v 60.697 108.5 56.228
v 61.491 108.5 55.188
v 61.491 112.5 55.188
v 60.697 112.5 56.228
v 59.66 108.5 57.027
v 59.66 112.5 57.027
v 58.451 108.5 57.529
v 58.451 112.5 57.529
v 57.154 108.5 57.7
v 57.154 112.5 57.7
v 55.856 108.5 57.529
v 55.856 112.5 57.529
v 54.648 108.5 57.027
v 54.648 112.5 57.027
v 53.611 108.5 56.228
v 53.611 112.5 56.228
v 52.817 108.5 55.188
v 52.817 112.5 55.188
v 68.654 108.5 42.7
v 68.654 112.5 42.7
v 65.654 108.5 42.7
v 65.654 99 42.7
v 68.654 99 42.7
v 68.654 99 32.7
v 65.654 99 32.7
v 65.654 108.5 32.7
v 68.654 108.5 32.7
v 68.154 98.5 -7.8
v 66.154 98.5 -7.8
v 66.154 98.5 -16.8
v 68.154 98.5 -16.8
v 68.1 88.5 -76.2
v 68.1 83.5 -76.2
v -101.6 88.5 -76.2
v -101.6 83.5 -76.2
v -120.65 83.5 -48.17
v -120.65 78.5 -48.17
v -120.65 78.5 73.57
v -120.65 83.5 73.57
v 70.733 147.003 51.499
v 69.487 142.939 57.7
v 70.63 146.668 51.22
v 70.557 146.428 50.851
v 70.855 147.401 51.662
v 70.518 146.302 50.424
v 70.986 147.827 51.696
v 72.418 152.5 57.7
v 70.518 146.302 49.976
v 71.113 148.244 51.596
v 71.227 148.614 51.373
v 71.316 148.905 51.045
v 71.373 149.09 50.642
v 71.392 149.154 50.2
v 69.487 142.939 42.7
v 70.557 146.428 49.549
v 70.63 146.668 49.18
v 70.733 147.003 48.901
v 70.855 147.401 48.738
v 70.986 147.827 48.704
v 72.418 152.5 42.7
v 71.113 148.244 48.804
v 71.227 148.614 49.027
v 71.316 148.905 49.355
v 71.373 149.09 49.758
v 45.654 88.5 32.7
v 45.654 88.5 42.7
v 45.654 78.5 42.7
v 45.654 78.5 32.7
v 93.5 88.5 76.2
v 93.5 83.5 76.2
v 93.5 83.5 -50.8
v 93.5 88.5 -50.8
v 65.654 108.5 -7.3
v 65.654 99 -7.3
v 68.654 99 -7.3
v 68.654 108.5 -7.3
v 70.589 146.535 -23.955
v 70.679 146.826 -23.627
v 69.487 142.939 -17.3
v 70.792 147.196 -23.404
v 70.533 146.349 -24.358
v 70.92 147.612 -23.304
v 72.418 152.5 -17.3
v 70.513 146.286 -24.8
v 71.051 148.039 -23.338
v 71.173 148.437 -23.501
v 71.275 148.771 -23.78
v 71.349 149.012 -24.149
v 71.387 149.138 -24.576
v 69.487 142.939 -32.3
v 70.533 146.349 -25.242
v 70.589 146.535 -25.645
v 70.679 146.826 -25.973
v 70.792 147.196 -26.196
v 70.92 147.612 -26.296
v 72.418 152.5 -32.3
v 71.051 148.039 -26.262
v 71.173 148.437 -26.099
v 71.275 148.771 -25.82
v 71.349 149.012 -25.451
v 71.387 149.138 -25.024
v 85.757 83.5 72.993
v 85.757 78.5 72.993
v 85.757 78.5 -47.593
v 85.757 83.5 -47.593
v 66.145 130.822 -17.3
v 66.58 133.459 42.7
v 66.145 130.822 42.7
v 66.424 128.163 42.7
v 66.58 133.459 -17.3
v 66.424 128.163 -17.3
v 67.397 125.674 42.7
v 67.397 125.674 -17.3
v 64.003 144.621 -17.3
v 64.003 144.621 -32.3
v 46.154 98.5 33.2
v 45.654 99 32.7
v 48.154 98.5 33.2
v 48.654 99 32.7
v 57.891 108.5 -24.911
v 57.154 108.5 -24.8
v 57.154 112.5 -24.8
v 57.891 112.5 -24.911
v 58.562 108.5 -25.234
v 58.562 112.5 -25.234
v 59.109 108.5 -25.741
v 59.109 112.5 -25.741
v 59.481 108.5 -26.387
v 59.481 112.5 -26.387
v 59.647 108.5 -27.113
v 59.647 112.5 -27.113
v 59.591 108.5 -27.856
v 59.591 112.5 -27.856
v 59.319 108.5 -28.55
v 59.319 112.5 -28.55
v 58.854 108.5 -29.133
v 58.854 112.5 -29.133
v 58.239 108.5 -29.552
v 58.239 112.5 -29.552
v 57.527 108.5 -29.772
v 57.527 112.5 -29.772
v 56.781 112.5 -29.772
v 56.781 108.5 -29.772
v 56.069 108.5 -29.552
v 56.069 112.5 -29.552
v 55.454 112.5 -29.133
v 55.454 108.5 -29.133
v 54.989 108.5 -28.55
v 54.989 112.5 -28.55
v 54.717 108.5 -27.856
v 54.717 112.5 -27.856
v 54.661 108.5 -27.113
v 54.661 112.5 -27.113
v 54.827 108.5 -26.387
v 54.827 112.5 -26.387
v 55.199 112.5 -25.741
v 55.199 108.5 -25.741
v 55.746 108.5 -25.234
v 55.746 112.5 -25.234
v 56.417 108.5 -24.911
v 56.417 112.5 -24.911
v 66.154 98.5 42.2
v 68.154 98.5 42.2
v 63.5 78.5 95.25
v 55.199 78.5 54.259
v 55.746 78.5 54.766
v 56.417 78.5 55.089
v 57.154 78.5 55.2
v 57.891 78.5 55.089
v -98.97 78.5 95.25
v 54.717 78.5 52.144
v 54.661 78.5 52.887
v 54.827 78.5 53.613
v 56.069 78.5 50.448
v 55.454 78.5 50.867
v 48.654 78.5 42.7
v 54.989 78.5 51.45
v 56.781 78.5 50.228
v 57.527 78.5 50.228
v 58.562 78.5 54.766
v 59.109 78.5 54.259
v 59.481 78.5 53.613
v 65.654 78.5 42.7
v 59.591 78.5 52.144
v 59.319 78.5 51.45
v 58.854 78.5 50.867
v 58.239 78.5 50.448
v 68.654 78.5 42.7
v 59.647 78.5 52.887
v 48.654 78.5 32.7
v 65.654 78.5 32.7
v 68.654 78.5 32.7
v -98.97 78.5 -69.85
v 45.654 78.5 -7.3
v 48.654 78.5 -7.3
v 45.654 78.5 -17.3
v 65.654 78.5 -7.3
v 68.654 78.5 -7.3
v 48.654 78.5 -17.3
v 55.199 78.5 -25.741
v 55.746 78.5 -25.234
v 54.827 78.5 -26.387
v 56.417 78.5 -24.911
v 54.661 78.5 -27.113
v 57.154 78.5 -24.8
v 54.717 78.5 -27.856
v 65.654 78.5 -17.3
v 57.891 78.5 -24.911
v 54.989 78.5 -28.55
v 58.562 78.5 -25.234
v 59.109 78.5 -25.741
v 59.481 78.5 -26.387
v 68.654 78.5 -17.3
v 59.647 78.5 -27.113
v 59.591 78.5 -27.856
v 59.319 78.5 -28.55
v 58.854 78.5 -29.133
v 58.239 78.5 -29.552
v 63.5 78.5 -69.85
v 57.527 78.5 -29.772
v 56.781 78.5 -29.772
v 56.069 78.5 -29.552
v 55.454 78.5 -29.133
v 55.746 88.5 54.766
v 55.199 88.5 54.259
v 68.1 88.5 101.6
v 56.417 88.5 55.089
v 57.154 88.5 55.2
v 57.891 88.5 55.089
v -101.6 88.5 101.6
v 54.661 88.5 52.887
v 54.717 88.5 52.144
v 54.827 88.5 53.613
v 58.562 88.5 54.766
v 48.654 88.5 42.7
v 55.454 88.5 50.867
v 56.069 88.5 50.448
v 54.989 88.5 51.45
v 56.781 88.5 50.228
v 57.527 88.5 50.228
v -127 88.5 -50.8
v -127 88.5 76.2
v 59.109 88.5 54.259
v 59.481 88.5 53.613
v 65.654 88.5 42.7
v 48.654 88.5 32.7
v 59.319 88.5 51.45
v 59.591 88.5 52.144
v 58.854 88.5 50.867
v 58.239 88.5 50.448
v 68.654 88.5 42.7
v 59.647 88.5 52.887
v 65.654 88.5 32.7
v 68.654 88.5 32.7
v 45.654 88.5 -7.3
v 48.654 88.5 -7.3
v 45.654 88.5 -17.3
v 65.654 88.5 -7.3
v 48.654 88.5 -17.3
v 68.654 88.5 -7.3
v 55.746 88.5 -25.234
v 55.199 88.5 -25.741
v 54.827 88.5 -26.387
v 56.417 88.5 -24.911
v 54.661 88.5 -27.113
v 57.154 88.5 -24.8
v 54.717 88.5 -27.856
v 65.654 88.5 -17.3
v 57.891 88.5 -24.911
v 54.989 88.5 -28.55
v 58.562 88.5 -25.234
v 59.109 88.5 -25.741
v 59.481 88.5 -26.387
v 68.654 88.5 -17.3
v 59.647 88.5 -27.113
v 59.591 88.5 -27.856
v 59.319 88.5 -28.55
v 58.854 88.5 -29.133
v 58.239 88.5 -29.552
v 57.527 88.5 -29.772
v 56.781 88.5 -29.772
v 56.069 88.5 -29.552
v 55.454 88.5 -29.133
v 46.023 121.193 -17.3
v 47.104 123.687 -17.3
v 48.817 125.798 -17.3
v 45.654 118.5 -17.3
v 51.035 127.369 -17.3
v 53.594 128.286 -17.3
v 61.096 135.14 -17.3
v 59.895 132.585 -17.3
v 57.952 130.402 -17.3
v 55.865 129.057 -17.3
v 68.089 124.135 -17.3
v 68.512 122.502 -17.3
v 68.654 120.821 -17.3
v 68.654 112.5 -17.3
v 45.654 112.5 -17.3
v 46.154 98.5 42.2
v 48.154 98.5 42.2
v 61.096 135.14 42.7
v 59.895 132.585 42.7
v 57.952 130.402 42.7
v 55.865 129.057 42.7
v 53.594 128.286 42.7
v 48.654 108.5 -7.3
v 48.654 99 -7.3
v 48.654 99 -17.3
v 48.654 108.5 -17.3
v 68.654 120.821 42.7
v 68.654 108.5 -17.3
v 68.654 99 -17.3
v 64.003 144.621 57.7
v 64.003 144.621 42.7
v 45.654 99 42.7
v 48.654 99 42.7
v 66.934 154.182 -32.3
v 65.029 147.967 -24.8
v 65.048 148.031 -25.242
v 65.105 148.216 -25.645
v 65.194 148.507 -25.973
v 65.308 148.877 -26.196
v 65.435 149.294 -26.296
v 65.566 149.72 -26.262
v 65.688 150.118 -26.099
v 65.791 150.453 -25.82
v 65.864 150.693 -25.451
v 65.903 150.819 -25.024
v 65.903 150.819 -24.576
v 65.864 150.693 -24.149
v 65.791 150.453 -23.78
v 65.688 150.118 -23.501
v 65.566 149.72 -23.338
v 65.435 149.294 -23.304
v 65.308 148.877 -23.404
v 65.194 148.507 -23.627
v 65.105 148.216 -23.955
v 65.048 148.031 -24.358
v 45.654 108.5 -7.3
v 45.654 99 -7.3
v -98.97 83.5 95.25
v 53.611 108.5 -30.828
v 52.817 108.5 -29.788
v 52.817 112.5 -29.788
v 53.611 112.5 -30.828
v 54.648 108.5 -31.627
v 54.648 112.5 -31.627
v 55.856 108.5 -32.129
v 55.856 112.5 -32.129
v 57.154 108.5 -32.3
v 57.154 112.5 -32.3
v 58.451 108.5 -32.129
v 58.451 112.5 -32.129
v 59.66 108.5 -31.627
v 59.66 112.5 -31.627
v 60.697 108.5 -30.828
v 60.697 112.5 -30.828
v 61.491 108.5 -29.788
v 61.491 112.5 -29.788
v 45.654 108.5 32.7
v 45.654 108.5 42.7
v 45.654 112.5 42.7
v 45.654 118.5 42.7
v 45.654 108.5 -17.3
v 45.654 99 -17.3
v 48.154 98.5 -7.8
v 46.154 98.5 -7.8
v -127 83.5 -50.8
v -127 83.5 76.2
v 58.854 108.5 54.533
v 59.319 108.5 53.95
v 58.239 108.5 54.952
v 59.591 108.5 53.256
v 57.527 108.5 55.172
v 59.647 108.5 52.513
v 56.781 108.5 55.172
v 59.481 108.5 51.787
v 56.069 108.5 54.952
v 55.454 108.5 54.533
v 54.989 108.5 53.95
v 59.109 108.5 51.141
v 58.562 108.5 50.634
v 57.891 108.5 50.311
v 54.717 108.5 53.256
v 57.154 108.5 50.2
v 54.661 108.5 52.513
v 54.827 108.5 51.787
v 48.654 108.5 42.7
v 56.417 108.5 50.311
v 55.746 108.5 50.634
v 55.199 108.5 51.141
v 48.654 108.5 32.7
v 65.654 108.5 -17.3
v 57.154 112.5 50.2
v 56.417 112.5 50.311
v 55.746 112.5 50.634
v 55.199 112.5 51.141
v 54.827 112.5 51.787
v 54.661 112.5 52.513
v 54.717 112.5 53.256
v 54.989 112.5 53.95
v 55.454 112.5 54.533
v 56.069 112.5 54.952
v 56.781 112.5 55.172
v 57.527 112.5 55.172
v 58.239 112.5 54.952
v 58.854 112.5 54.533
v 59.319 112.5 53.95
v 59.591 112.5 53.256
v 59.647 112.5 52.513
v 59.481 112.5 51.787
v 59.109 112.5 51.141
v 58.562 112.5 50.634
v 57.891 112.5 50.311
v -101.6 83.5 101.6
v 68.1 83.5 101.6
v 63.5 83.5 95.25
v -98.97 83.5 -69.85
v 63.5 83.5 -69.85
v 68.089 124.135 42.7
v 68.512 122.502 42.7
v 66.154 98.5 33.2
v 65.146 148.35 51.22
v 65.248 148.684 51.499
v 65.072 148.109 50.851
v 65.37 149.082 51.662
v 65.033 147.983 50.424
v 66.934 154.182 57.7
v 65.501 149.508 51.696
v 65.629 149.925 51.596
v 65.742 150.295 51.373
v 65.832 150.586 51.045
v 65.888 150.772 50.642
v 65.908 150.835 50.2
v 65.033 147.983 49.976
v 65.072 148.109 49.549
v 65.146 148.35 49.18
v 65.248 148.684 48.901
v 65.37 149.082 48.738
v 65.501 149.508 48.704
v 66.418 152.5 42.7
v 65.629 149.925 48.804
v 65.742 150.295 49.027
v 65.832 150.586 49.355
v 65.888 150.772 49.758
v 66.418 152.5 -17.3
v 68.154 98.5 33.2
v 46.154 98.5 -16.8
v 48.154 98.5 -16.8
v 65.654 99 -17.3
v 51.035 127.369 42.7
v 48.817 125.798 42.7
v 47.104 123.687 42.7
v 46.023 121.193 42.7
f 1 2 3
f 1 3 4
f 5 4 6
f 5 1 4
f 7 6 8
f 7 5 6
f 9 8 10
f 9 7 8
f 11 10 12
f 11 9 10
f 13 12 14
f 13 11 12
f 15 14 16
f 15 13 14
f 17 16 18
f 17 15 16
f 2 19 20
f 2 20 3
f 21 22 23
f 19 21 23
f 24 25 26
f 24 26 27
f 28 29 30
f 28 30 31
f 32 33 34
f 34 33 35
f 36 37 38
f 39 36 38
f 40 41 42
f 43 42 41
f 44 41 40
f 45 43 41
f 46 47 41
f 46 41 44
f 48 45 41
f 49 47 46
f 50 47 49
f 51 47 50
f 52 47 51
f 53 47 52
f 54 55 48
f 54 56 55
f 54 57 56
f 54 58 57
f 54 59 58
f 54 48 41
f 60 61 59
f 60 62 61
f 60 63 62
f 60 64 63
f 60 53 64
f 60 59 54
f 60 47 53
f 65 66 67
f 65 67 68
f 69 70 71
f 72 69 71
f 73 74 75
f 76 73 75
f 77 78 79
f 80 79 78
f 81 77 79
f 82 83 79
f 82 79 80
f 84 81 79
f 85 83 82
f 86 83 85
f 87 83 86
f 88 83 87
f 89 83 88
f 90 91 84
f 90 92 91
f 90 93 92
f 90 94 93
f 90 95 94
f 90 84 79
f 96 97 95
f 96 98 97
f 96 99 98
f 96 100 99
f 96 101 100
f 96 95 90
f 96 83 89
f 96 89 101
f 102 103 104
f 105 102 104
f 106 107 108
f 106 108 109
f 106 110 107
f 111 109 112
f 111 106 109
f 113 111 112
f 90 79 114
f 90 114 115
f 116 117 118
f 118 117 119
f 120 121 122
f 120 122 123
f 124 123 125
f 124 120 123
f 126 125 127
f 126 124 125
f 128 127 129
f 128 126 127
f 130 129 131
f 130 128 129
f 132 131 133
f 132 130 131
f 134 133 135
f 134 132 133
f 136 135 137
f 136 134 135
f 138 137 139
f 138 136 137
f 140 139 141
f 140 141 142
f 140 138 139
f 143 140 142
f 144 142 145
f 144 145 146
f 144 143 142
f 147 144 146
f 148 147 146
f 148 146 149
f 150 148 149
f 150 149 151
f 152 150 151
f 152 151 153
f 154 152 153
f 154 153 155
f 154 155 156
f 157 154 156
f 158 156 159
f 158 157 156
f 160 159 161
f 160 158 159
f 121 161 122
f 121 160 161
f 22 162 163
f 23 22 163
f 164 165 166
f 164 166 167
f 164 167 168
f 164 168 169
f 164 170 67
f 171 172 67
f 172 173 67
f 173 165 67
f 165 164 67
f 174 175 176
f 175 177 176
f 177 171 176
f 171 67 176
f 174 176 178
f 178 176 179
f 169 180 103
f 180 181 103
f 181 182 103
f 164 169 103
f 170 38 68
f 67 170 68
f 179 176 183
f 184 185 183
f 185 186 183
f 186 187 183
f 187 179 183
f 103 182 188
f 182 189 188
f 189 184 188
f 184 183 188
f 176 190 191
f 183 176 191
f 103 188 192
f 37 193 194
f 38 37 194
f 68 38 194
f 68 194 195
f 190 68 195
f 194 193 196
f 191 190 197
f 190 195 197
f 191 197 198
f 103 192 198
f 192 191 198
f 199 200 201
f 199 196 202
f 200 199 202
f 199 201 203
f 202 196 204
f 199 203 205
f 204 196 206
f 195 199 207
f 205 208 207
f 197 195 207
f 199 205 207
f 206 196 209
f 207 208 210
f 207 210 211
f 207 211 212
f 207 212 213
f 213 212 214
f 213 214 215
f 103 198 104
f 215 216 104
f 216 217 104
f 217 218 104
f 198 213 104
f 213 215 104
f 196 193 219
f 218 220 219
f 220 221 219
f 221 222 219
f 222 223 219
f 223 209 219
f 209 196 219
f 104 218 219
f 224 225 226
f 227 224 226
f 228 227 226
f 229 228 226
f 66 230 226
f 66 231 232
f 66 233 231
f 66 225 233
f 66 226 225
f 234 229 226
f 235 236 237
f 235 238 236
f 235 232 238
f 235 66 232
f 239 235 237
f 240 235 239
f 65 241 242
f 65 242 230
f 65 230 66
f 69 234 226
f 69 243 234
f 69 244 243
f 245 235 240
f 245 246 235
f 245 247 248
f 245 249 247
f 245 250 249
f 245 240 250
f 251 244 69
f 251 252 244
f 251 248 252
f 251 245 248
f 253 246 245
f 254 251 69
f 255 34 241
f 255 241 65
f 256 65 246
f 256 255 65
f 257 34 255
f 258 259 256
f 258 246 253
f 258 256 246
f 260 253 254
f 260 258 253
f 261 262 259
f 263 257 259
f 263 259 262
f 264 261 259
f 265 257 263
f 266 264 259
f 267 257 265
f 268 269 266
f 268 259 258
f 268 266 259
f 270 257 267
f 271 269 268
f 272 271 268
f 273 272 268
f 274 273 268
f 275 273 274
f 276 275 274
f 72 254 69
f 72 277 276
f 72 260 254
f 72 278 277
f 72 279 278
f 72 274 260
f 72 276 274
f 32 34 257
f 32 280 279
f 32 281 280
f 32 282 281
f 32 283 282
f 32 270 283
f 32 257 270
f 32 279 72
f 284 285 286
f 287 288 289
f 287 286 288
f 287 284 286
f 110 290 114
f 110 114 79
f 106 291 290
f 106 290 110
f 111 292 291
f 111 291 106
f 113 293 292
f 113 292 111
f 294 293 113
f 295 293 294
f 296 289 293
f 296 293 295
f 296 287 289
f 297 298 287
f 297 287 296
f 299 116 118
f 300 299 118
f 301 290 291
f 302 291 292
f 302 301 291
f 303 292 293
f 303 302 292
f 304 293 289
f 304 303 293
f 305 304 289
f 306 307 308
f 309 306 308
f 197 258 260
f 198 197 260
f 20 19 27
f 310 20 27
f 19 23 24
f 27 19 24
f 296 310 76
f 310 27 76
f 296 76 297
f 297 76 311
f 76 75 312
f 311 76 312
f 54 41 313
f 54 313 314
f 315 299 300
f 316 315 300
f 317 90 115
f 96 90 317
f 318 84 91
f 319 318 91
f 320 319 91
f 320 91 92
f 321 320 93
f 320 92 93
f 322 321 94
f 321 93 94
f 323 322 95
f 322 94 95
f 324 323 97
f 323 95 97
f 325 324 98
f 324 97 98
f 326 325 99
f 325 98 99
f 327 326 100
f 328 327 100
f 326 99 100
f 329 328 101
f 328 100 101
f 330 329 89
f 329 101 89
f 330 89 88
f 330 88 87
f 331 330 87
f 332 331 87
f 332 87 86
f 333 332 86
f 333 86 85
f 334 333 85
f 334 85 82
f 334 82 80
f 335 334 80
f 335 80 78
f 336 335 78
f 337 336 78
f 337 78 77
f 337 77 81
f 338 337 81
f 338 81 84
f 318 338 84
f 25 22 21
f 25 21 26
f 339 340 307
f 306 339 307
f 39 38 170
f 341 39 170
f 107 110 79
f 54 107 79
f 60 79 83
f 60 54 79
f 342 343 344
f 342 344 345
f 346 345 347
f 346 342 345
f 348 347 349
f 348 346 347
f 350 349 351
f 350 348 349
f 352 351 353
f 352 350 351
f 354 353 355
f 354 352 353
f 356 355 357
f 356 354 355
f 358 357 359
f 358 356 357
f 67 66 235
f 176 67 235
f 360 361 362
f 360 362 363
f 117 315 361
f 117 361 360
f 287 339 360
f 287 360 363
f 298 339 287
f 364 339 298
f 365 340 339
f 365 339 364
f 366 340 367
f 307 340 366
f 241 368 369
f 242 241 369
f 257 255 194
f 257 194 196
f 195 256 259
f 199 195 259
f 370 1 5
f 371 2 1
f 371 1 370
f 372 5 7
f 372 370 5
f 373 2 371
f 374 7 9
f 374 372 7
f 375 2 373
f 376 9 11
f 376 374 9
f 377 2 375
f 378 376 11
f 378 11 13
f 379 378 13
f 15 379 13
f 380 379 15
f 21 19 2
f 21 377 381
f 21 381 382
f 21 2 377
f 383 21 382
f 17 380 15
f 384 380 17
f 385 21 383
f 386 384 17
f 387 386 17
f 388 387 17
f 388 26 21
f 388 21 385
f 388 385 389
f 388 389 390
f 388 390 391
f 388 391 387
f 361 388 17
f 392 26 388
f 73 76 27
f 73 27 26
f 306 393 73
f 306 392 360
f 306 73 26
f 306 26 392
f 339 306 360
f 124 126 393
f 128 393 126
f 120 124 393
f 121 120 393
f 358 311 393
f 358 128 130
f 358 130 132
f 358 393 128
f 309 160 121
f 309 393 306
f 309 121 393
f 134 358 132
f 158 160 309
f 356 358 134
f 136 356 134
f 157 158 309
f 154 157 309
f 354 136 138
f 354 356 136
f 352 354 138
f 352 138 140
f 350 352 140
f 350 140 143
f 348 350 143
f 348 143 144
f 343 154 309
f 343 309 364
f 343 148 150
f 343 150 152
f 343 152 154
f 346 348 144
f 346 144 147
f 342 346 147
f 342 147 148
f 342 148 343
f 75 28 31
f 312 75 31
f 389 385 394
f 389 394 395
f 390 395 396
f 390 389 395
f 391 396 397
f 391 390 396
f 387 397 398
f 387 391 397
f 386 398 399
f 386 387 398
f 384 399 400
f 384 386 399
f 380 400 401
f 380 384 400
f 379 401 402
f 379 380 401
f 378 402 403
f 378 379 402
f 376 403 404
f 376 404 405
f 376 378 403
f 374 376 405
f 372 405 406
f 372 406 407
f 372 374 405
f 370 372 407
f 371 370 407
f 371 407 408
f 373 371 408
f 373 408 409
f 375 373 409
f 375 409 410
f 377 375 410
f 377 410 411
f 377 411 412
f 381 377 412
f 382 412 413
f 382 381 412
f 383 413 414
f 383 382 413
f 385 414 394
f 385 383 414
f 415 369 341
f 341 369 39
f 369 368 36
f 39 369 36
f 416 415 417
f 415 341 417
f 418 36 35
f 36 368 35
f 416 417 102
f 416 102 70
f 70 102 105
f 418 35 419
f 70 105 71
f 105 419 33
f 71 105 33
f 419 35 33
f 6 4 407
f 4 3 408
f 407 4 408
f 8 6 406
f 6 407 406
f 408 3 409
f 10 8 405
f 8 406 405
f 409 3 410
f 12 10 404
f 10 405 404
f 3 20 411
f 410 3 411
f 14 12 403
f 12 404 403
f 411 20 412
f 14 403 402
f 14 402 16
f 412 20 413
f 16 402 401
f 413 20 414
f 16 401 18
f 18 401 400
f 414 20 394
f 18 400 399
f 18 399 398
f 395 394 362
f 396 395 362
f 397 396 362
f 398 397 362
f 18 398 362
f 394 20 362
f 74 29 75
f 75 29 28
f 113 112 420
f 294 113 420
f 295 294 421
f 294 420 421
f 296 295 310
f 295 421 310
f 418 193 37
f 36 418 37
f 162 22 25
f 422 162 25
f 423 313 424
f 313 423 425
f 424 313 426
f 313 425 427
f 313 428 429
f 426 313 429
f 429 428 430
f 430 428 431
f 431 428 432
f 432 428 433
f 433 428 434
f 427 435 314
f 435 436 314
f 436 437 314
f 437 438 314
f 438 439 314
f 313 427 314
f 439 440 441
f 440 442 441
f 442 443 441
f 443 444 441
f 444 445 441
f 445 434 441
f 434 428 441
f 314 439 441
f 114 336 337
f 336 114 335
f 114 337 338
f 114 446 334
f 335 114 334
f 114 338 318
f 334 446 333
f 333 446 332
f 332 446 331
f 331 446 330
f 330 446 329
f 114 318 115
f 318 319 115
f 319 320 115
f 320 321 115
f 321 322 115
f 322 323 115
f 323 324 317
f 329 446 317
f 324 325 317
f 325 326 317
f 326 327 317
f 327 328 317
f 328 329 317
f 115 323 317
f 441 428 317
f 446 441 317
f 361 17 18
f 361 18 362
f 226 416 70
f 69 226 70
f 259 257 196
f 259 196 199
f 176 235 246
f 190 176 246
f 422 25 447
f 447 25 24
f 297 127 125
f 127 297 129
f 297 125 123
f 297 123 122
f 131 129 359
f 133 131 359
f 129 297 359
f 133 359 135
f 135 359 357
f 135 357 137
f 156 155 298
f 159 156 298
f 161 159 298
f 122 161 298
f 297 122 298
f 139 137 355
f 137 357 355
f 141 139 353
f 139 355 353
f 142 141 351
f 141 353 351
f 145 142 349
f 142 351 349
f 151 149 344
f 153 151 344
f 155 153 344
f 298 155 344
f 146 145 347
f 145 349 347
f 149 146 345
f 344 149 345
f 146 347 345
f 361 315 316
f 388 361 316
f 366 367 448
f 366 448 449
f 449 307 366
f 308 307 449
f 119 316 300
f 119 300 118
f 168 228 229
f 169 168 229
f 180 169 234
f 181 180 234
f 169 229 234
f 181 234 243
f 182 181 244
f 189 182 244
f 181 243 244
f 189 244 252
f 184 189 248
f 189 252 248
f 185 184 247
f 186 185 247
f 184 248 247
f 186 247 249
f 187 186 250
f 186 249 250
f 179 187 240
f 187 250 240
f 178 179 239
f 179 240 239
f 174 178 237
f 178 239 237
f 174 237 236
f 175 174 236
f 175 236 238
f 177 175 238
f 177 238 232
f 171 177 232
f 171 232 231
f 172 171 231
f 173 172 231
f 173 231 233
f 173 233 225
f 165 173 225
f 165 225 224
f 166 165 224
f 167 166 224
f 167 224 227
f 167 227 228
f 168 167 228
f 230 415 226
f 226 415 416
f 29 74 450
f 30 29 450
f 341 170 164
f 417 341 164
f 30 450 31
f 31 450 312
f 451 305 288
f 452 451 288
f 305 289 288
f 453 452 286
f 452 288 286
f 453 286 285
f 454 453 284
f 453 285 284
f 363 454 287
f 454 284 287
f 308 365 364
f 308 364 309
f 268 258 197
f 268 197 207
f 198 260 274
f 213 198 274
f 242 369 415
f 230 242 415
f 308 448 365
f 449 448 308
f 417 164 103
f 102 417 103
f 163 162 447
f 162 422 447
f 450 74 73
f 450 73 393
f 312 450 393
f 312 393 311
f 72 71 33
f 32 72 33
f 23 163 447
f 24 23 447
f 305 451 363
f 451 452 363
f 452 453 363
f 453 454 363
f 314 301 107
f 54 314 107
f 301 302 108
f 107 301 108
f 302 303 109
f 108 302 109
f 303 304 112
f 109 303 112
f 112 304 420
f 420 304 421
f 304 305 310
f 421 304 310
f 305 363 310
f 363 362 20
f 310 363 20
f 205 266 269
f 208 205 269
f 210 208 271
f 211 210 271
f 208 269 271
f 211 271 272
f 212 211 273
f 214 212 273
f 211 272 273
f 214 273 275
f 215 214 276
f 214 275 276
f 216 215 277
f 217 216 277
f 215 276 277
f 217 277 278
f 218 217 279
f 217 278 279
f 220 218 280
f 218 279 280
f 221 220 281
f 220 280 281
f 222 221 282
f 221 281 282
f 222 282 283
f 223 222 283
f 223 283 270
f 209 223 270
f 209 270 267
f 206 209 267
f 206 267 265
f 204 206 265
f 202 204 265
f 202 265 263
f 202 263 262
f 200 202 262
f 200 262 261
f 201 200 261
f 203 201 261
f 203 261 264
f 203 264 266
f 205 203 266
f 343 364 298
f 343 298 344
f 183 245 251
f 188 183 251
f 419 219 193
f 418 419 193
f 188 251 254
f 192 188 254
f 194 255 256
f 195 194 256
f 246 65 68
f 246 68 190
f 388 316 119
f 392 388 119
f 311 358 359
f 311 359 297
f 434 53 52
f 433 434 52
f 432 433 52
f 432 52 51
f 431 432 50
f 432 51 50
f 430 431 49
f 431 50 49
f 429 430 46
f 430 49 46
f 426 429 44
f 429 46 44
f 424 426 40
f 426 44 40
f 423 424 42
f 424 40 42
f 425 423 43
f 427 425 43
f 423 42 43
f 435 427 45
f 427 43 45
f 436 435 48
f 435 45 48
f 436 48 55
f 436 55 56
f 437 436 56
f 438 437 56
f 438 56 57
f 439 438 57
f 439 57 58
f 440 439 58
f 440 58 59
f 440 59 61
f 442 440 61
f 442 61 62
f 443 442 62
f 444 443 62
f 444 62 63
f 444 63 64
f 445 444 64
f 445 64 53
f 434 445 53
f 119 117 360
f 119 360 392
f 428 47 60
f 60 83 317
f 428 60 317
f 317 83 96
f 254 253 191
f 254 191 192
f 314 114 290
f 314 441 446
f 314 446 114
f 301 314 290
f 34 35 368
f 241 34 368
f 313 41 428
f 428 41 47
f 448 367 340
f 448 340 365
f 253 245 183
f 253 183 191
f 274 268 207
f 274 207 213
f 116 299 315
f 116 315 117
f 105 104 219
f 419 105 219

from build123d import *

# Parameters (mm, degrees)
SKETCH2_W               = 190.5
SKETCH2_H               = 177.8
BOSS_EXTRUDE1_DEPTH     = 5.08
CHAMFER1_SIZE           = 25.4
BOSS_EXTRUDE3_DEPTH     = 68.42
SKETCH5_R               = 9
SKETCH5_R_2             = 1.5
CUT_EXTRUDE1_DEPTH      = 231.530019737
SKETCH10_W              = 177.8
SKETCH10_H              = 73.5
BOSS_EXTRUDE6_DEPTH     = 30
CHAMFER3_SIZE           = 25.4
CUT_EXTRUDE2_DEPTH      = 68.42
BOSS_EXTRUDE7_START     = 38.1
BOSS_EXTRUDE7_DEPTH     = 10
SKETCH13_W              = 15.24
SKETCH13_H              = 10
BOSS_EXTRUDE8_DEPTH     = 7
SKETCH14_R              = 2.5
CUT_EXTRUDE3_DEPTH      = 10
MIRROR4_COPY_1_SKETCH_W = 15.24
MIRROR4_COPY_1_SKETCH_H = 10
MIRROR4_COPY_1_DEPTH    = 7
MIRROR4_COPY_2_SKETCH_R = 2.5
MIRROR4_COPY_2_DEPTH    = 10
BOSS_EXTRUDE9_START     = 5
BOSS_EXTRUDE9_DEPTH     = 5
BOSS_EXTRUDE10_START    = 10
BOSS_EXTRUDE10_DEPTH    = 5
SKETCH16_R              = 2.5
CUT_EXTRUDE4_DEPTH      = 163.946494286
SKETCH17_W              = 3
SKETCH17_H              = 10
CUT_EXTRUDE5_DEPTH      = 163.946494286
BOSS_EXTRUDE11_START    = 10
SKETCH18_W              = 3
SKETCH18_H              = 10
BOSS_EXTRUDE11_DEPTH    = 10
BOSS_EXTRUDE11_2_DEPTH  = 10
BOSS_EXTRUDE11_3_DEPTH  = 10
BOSS_EXTRUDE11_4_DEPTH  = 10
SKETCH19_W              = 23
SKETCH19_H              = 60
BOSS_EXTRUDE12_DEPTH    = 20
BOSS_EXTRUDE13_START    = -20
SKETCH20_R              = 2.5
BOSS_EXTRUDE13_DEPTH    = 4
BOSS_EXTRUDE16_DEPTH    = 60
FILLET1_R               = 10
SKETCH24_W              = 90
SKETCH24_H              = 10
BOSS_EXTRUDE17_DEPTH    = 5.736414059
SKETCH25_R              = 1.5
CUT_EXTRUDE7_DEPTH      = 10
FILLET2_R               = 10
FILLET3_R               = 10
FILLET4_R               = 10
CHAMFER4_SIZE           = 0.5


with BuildPart() as part:
    # Sketch2 → Boss-Extrude1 (new body)
    with BuildSketch(Plane(origin=(0, 0, 0), x_dir=(1, 0, 0), z_dir=(0, 1, 0))):
        with Locations((-31.75, -12.7)):
            Rectangle(SKETCH2_W, SKETCH2_H)
    extrude(amount=BOSS_EXTRUDE1_DEPTH)

    # Chamfer1
    chamfer1_edges = [part.edges().sort_by_distance(p)[0] for p in [
        (-127, 2.54, -76.2),
        (-127, 2.54, 101.6),
    ]]
    chamfer(chamfer1_edges, length=CHAMFER1_SIZE)

    # Sketch4 → Boss-Extrude3 (add)
    with BuildSketch(Plane(origin=(0, 5.08, 0), x_dir=(1, 0, 0), z_dir=(0, 1, 0))):
        Polygon((57.15, 69.85), (-98.969743879, 69.85), (-120.65, 48.169743879), (-120.65, -73.569743879), (-98.969743879, -95.25), (57.15, -95.25), (63.5, -95.25), (63.5, -101.6), (-101.6, -101.6), (-127, -76.2), (-127, 50.8), (-101.6, 76.2), (63.5, 76.2), (63.5, 69.85), align=None)
    extrude(amount=BOSS_EXTRUDE3_DEPTH)

    # Sketch5 → Cut-Extrude1 (cut, through all)
    with BuildSketch(Plane.XY.offset(101.6)):
        with Locations((-50.8, 31.75)):
            Circle(SKETCH5_R)
        with Locations((-50.8, 47.25)):
            Circle(SKETCH5_R_2)
        with Locations((-37.376606241, 39.5)):
            Circle(SKETCH5_R_2)
        with Locations((-37.376606241, 24)):
            Circle(SKETCH5_R_2)
        with Locations((-50.8, 16.25)):
            Circle(SKETCH5_R_2)
        with Locations((-64.223393759, 24)):
            Circle(SKETCH5_R_2)
        with Locations((-64.223393759, 39.5)):
            Circle(SKETCH5_R_2)
    extrude(amount=-CUT_EXTRUDE1_DEPTH, mode=Mode.SUBTRACT)

    # Sketch10 → Boss-Extrude6 (add)
    with BuildSketch(Plane(origin=(63.5, 0, 0), x_dir=(0, 0, -1), z_dir=(1, 0, 0))):
        with Locations((-12.7, 36.75)):
            Rectangle(SKETCH10_W, SKETCH10_H)
    extrude(amount=BOSS_EXTRUDE6_DEPTH)

    # Chamfer3
    chamfer3_edges = [part.edges().sort_by_distance(p)[0] for p in [
        (93.5, 36.75, 101.6),
        (93.5, 36.75, -76.2),
    ]]
    chamfer(chamfer3_edges, length=CHAMFER3_SIZE)

    # Sketch11 → Cut-Extrude2 (cut)
    with BuildSketch(Plane(origin=(0, 73.5, 0), x_dir=(1, 0, 0), z_dir=(0, 1, 0))):
        Polygon((85.757180746, -72.992819254), (85.757180746, 47.592819254), (63.5, 69.85), (63.5, -95.25), align=None)
    extrude(amount=-CUT_EXTRUDE2_DEPTH, mode=Mode.SUBTRACT)

    # Sketch12 → Boss-Extrude7 (add)
    with BuildSketch(Plane(origin=(0, 0, 95.25), x_dir=(-1, 0, 0), z_dir=(0, 0, -1)).offset(BOSS_EXTRUDE7_START)):
        with BuildLine():
            Line((25.8, 5.08), (75.8, 5.08))
            Line((75.8, 5.08), (75.8, 31.75))
            Line((75.8, 31.75), (69.8, 31.75))
            ThreePointArc((69.8, 31.75), (50.8, 12.75), (31.8, 31.75))
            Line((31.8, 31.75), (25.8, 31.75))
            Line((25.8, 31.75), (25.8, 5.08))
        make_face()
    boss_extrude7 = extrude(amount=BOSS_EXTRUDE7_DEPTH)

    # Sketch13 → Boss-Extrude8 (add)
    with BuildSketch(Plane(origin=(0, 31.75, 0), x_dir=(1, 0, 0), z_dir=(0, 1, 0))):
        with Locations((-24.18, -52.15)):
            Rectangle(SKETCH13_W, SKETCH13_H)
    boss_extrude8 = extrude(amount=-BOSS_EXTRUDE8_DEPTH)

    # Sketch14 → Cut-Extrude3 (cut)
    with BuildSketch(Plane(origin=(0, 31.75, 0), x_dir=(1, 0, 0), z_dir=(0, 1, 0))):
        with Locations(Location((-20.37, -52.15, 0), (0, 0, 270))):
            Circle(SKETCH14_R)
    cut_extrude3 = extrude(amount=-CUT_EXTRUDE3_DEPTH, mode=Mode.SUBTRACT)

    # Mirror2: Boss-Extrude8 across plane
    add(boss_extrude8.mirror(Plane.ZY.offset(50.8)))

    # Mirror3: Cut-Extrude3 across plane
    add(cut_extrude3.mirror(Plane.ZY.offset(50.8)), mode=Mode.SUBTRACT)

    # Mirror4: Boss-Extrude7, Boss-Extrude8, Cut-Extrude3 across plane
    add(boss_extrude7.mirror(Plane.XY.offset(12.7)))
    add(boss_extrude8.mirror(Plane.XY.offset(12.7)))
    add(cut_extrude3.mirror(Plane.XY.offset(12.7)), mode=Mode.SUBTRACT)

    # Mirror4 copy 1 sketch → Mirror4 copy 1 (add)
    with BuildSketch(Plane(origin=(-101.6, 31.75, 25.4), x_dir=(-1, 0, 0), z_dir=(0, 1, 0))):
        with Locations((-24.18, -52.15)):
            Rectangle(MIRROR4_COPY_1_SKETCH_W, MIRROR4_COPY_1_SKETCH_H)
    extrude(amount=-MIRROR4_COPY_1_DEPTH)

    # Mirror4 copy 2 sketch → Mirror4 copy 2 (cut)
    with BuildSketch(Plane(origin=(-101.6, 31.75, 25.4), x_dir=(-1, 0, 0), z_dir=(0, 1, 0))):
        with Locations(Location((-20.37, -52.15, 0), (0, 0, 270))):
            Circle(MIRROR4_COPY_2_SKETCH_R)
    extrude(amount=-MIRROR4_COPY_2_DEPTH, mode=Mode.SUBTRACT)


with BuildPart() as body_2:
    # Sketch15 → Boss-Extrude9 (new body)
    with BuildSketch(Plane(origin=(0, 73.5, 0), x_dir=(1, 0, 0), z_dir=(0, 1, 0)).offset(BOSS_EXTRUDE9_START)):
        Polygon((85.757180746, 47.592819254), (63.5, 69.85), (-98.969743879, 69.85), (-120.65, 48.169743879), (-120.65, -73.569743879), (-98.969743879, -95.25), (63.5, -95.25), (85.757180746, -72.992819254), align=None)
    extrude(amount=BOSS_EXTRUDE9_DEPTH)

    # Sketch15<3> → Boss-Extrude10 (add)
    with BuildSketch(Plane(origin=(0, 73.5, 0), x_dir=(1, 0, 0), z_dir=(0, 1, 0)).offset(BOSS_EXTRUDE10_START)):
        Polygon((93.5, -76.2), (93.5, 50.8), (68.1, 76.2), (-101.6, 76.2), (-127, 50.8), (-127, -76.2), (-101.6, -101.6), (68.1, -101.6), align=None)
    extrude(amount=BOSS_EXTRUDE10_DEPTH)

    # Sketch16 → Cut-Extrude4 (cut, through all)
    with BuildSketch(Plane(origin=(0, 88.5, 0), x_dir=(1, 0, 0), z_dir=(0, 1, 0))):
        with Locations(Location((57.153941403, 27.3, 0), (0, 0, 270))):
            Circle(SKETCH16_R)
        with Locations(Location((57.153941403, -52.7, 0), (0, 0, 270))):
            Circle(SKETCH16_R)
    extrude(amount=-CUT_EXTRUDE4_DEPTH, mode=Mode.SUBTRACT)

    # Sketch17 → Cut-Extrude5 (cut, through all)
    with BuildSketch(Plane(origin=(0, 88.5, 0), x_dir=(1, 0, 0), z_dir=(0, 1, 0))):
        with Locations((47.153941403, 12.3)):
            Rectangle(SKETCH17_W, SKETCH17_H)
        with Locations((67.153941403, 12.3)):
            Rectangle(SKETCH17_W, SKETCH17_H)
        with Locations((47.153941403, -37.7)):
            Rectangle(SKETCH17_W, SKETCH17_H)
        with Locations((67.153941403, -37.7)):
            Rectangle(SKETCH17_W, SKETCH17_H)
    extrude(amount=-CUT_EXTRUDE5_DEPTH, mode=Mode.SUBTRACT)


with BuildPart() as body_2_2:
    # Sketch18 → Boss-Extrude11 (new body)
    with BuildSketch(Plane(origin=(0, 88.5, 0), x_dir=(1, 0, 0), z_dir=(0, 1, 0)).offset(BOSS_EXTRUDE11_START)):
        with Locations((67.153941403, -37.7)):
            Rectangle(SKETCH18_W, SKETCH18_H)
    extrude(amount=BOSS_EXTRUDE11_DEPTH)



with BuildPart() as body_3:
    # Sketch18 → Boss-Extrude11 2 (new body)
    with BuildSketch(Plane(origin=(0, 88.5, 0), x_dir=(1, 0, 0), z_dir=(0, 1, 0)).offset(BOSS_EXTRUDE11_START)):
        with Locations((47.153941403, -37.7)):
            Rectangle(SKETCH18_W, SKETCH18_H)
    extrude(amount=BOSS_EXTRUDE11_2_DEPTH)


with BuildPart() as body_4:
    # Sketch18 → Boss-Extrude11 3 (new body)
    with BuildSketch(Plane(origin=(0, 88.5, 0), x_dir=(1, 0, 0), z_dir=(0, 1, 0)).offset(BOSS_EXTRUDE11_START)):
        with Locations((47.153941403, 12.3)):
            Rectangle(SKETCH18_W, SKETCH18_H)
    extrude(amount=BOSS_EXTRUDE11_3_DEPTH)


with BuildPart() as body_5:
    # Sketch18 → Boss-Extrude11 4 (new body)
    with BuildSketch(Plane(origin=(0, 88.5, 0), x_dir=(1, 0, 0), z_dir=(0, 1, 0)).offset(BOSS_EXTRUDE11_START)):
        with Locations((67.153941403, 12.3)):
            Rectangle(SKETCH18_W, SKETCH18_H)
    extrude(amount=BOSS_EXTRUDE11_4_DEPTH)


with BuildPart() as body_2_2_1:
    add(body_2_2.part)

    add(body_3.part)  # Boss-Extrude12 merges body 3

    add(body_4.part)  # Boss-Extrude12 merges body 4

    add(body_5.part)  # Boss-Extrude12 merges body 5
    # Sketch19 → Boss-Extrude12 (add)
    with BuildSketch(Plane(origin=(0, 108.5, 0), x_dir=(1, 0, 0), z_dir=(0, 1, 0))):
        with Locations((57.153941403, -12.7)):
            Rectangle(SKETCH19_W, SKETCH19_H)
    extrude(amount=BOSS_EXTRUDE12_DEPTH)

    # Sketch20 → Boss-Extrude13 (add)
    # profile 1 of 2: a face of its own
    with BuildSketch(Plane(origin=(0, 128.5, 0), x_dir=(1, 0, 0), z_dir=(0, 1, 0)).offset(BOSS_EXTRUDE13_START)):
        with BuildLine():
            Line((45.653941403, 17.3), (52.816765935, 29.787751788))
            ThreePointArc((52.816765935, 29.787751788), (57.153941403, 32.3), (61.491116871, 29.787751788))
            Line((61.491116871, 29.787751788), (68.653941403, 17.3))
            Line((68.653941403, 17.3), (45.653941403, 17.3))
        make_face()
        with Locations(Location((57.153941403, 27.3, 0), (0, 0, 270))):
            Circle(SKETCH20_R, mode=Mode.SUBTRACT)
    # profile 2 of 2: a face of its own
    with BuildSketch(Plane(origin=(0, 128.5, 0), x_dir=(1, 0, 0), z_dir=(0, 1, 0)).offset(BOSS_EXTRUDE13_START)):
        with BuildLine():
            Line((68.653941403, -42.7), (61.491116871, -55.187751788))
            ThreePointArc((61.491116871, -55.187751788), (57.153941403, -57.7), (52.816765935, -55.187751788))
            Line((52.816765935, -55.187751788), (45.653941403, -42.7))
            Line((45.653941403, -42.7), (68.653941403, -42.7))
        make_face()
        with Locations(Location((57.153941403, -52.7, 0), (0, 0, 90))):
            Circle(SKETCH20_R, mode=Mode.SUBTRACT)
    extrude(amount=BOSS_EXTRUDE13_DEPTH)

    # Sketch23 → Boss-Extrude16 (add)
    with BuildSketch(Plane.XY.offset(42.7)):
        Polygon((60.153941403, 112.5), (72.418398612, 152.5), (66.418398612, 152.5), (54.153941403, 112.5), align=None)
    extrude(amount=-BOSS_EXTRUDE16_DEPTH)

    # Fillet1
    # the kernel refuses this fillet: 10 mm, written as the material it takes off along each edge
    with BuildSketch(Plane(origin=(68.653941403, 128.5, 61.897321696), x_dir=(-1, 0, 0), z_dir=(0, 0, -1))) as fillet1_piece_1:
        with BuildLine():
            CenterArc((10, -7.678928678), FILLET1_R, 129.834954534, 50.165045466)
            Line((0, -7.678928678), (-0.2, -7.678928678))
            Line((-0.2, -7.678928678), (-0.2, 0))
            Line((-0.2, 0), (0, 0.2))
            ThreePointArc((0, 0.2), (1.797108558, 0.2), (3.466101459, 0.153578574))
            Line((3.466101459, 0.153578574), (3.594217116, 0))
        make_face()
    extrude(amount=98.394643391, mode=Mode.SUBTRACT)

    # Sketch24 → Boss-Extrude17 (add)
    with BuildSketch(Plane(origin=(23.455125777, -7.191609661, 0), x_dir=(0, 0, -1), z_dir=(0.9560690098650367, -0.2931416865198267, 0))):
        with Locations((-12.7, 162.029375509)):
            Rectangle(SKETCH24_W, SKETCH24_H)
    extrude(amount=-BOSS_EXTRUDE17_DEPTH)

    # Sketch25 → Cut-Extrude7 (cut)
    with BuildSketch(Plane(origin=(23.455125777, -7.191609661, 0), x_dir=(0, 0, -1), z_dir=(0.9560690098650367, -0.2931416865198267, 0))):
        with Locations(Location((-50.2, 162.029375509, 0), (0, 0, 90))):
            Circle(SKETCH25_R)
        with Locations(Location((24.8, 162.029375509, 0), (0, 0, 270))):
            Circle(SKETCH25_R)
    extrude(amount=-CUT_EXTRUDE7_DEPTH, mode=Mode.SUBTRACT)

    # Fillet2
    fillet2_edges = [body_2_2_1.edges().sort_by_distance(p)[0] for p in [
        (45.653941403, 128.5, 12.7),
    ]]
    fillet(fillet2_edges, radius=FILLET2_R)

    # Fillet3
    fillet3_edges = [body_2_2_1.edges().sort_by_distance(p)[0] for p in [
        (65.059724287, 128.5, 12.7),
    ]]
    fillet(fillet3_edges, radius=FILLET3_R)

    # Fillet4
    fillet4_edges = [body_2_2_1.edges().sort_by_distance(p)[0] for p in [
        (59.059724287, 128.5, 12.7),
    ]]
    fillet(fillet4_edges, radius=FILLET4_R)

    # Chamfer4
    chamfer4_edges = [body_2_2_1.edges().sort_by_distance(p)[0] for p in [
        (67.153941403, 98.5, 42.7),
        (68.653941403, 98.5, -12.3),
        (67.153941403, 98.5, -7.3),
        (65.653941403, 98.5, -12.3),
        (67.153941403, 98.5, -17.3),
        (65.653941403, 98.5, 37.7),
        (67.153941403, 98.5, 32.7),
        (48.653941403, 98.5, 37.7),
        (47.153941403, 98.5, 42.7),
        (45.653941403, 98.5, 37.7),
        (47.153941403, 98.5, 32.7),
        (68.653941403, 98.5, 37.7),
        (47.153941403, 98.5, -7.3),
        (48.653941403, 98.5, -12.3),
        (47.153941403, 98.5, -17.3),
        (45.653941403, 98.5, -12.3),
    ]]
    chamfer(chamfer4_edges, length=CHAMFER4_SIZE)


solid = Compound([body_2.part, body_2_2_1.part])
